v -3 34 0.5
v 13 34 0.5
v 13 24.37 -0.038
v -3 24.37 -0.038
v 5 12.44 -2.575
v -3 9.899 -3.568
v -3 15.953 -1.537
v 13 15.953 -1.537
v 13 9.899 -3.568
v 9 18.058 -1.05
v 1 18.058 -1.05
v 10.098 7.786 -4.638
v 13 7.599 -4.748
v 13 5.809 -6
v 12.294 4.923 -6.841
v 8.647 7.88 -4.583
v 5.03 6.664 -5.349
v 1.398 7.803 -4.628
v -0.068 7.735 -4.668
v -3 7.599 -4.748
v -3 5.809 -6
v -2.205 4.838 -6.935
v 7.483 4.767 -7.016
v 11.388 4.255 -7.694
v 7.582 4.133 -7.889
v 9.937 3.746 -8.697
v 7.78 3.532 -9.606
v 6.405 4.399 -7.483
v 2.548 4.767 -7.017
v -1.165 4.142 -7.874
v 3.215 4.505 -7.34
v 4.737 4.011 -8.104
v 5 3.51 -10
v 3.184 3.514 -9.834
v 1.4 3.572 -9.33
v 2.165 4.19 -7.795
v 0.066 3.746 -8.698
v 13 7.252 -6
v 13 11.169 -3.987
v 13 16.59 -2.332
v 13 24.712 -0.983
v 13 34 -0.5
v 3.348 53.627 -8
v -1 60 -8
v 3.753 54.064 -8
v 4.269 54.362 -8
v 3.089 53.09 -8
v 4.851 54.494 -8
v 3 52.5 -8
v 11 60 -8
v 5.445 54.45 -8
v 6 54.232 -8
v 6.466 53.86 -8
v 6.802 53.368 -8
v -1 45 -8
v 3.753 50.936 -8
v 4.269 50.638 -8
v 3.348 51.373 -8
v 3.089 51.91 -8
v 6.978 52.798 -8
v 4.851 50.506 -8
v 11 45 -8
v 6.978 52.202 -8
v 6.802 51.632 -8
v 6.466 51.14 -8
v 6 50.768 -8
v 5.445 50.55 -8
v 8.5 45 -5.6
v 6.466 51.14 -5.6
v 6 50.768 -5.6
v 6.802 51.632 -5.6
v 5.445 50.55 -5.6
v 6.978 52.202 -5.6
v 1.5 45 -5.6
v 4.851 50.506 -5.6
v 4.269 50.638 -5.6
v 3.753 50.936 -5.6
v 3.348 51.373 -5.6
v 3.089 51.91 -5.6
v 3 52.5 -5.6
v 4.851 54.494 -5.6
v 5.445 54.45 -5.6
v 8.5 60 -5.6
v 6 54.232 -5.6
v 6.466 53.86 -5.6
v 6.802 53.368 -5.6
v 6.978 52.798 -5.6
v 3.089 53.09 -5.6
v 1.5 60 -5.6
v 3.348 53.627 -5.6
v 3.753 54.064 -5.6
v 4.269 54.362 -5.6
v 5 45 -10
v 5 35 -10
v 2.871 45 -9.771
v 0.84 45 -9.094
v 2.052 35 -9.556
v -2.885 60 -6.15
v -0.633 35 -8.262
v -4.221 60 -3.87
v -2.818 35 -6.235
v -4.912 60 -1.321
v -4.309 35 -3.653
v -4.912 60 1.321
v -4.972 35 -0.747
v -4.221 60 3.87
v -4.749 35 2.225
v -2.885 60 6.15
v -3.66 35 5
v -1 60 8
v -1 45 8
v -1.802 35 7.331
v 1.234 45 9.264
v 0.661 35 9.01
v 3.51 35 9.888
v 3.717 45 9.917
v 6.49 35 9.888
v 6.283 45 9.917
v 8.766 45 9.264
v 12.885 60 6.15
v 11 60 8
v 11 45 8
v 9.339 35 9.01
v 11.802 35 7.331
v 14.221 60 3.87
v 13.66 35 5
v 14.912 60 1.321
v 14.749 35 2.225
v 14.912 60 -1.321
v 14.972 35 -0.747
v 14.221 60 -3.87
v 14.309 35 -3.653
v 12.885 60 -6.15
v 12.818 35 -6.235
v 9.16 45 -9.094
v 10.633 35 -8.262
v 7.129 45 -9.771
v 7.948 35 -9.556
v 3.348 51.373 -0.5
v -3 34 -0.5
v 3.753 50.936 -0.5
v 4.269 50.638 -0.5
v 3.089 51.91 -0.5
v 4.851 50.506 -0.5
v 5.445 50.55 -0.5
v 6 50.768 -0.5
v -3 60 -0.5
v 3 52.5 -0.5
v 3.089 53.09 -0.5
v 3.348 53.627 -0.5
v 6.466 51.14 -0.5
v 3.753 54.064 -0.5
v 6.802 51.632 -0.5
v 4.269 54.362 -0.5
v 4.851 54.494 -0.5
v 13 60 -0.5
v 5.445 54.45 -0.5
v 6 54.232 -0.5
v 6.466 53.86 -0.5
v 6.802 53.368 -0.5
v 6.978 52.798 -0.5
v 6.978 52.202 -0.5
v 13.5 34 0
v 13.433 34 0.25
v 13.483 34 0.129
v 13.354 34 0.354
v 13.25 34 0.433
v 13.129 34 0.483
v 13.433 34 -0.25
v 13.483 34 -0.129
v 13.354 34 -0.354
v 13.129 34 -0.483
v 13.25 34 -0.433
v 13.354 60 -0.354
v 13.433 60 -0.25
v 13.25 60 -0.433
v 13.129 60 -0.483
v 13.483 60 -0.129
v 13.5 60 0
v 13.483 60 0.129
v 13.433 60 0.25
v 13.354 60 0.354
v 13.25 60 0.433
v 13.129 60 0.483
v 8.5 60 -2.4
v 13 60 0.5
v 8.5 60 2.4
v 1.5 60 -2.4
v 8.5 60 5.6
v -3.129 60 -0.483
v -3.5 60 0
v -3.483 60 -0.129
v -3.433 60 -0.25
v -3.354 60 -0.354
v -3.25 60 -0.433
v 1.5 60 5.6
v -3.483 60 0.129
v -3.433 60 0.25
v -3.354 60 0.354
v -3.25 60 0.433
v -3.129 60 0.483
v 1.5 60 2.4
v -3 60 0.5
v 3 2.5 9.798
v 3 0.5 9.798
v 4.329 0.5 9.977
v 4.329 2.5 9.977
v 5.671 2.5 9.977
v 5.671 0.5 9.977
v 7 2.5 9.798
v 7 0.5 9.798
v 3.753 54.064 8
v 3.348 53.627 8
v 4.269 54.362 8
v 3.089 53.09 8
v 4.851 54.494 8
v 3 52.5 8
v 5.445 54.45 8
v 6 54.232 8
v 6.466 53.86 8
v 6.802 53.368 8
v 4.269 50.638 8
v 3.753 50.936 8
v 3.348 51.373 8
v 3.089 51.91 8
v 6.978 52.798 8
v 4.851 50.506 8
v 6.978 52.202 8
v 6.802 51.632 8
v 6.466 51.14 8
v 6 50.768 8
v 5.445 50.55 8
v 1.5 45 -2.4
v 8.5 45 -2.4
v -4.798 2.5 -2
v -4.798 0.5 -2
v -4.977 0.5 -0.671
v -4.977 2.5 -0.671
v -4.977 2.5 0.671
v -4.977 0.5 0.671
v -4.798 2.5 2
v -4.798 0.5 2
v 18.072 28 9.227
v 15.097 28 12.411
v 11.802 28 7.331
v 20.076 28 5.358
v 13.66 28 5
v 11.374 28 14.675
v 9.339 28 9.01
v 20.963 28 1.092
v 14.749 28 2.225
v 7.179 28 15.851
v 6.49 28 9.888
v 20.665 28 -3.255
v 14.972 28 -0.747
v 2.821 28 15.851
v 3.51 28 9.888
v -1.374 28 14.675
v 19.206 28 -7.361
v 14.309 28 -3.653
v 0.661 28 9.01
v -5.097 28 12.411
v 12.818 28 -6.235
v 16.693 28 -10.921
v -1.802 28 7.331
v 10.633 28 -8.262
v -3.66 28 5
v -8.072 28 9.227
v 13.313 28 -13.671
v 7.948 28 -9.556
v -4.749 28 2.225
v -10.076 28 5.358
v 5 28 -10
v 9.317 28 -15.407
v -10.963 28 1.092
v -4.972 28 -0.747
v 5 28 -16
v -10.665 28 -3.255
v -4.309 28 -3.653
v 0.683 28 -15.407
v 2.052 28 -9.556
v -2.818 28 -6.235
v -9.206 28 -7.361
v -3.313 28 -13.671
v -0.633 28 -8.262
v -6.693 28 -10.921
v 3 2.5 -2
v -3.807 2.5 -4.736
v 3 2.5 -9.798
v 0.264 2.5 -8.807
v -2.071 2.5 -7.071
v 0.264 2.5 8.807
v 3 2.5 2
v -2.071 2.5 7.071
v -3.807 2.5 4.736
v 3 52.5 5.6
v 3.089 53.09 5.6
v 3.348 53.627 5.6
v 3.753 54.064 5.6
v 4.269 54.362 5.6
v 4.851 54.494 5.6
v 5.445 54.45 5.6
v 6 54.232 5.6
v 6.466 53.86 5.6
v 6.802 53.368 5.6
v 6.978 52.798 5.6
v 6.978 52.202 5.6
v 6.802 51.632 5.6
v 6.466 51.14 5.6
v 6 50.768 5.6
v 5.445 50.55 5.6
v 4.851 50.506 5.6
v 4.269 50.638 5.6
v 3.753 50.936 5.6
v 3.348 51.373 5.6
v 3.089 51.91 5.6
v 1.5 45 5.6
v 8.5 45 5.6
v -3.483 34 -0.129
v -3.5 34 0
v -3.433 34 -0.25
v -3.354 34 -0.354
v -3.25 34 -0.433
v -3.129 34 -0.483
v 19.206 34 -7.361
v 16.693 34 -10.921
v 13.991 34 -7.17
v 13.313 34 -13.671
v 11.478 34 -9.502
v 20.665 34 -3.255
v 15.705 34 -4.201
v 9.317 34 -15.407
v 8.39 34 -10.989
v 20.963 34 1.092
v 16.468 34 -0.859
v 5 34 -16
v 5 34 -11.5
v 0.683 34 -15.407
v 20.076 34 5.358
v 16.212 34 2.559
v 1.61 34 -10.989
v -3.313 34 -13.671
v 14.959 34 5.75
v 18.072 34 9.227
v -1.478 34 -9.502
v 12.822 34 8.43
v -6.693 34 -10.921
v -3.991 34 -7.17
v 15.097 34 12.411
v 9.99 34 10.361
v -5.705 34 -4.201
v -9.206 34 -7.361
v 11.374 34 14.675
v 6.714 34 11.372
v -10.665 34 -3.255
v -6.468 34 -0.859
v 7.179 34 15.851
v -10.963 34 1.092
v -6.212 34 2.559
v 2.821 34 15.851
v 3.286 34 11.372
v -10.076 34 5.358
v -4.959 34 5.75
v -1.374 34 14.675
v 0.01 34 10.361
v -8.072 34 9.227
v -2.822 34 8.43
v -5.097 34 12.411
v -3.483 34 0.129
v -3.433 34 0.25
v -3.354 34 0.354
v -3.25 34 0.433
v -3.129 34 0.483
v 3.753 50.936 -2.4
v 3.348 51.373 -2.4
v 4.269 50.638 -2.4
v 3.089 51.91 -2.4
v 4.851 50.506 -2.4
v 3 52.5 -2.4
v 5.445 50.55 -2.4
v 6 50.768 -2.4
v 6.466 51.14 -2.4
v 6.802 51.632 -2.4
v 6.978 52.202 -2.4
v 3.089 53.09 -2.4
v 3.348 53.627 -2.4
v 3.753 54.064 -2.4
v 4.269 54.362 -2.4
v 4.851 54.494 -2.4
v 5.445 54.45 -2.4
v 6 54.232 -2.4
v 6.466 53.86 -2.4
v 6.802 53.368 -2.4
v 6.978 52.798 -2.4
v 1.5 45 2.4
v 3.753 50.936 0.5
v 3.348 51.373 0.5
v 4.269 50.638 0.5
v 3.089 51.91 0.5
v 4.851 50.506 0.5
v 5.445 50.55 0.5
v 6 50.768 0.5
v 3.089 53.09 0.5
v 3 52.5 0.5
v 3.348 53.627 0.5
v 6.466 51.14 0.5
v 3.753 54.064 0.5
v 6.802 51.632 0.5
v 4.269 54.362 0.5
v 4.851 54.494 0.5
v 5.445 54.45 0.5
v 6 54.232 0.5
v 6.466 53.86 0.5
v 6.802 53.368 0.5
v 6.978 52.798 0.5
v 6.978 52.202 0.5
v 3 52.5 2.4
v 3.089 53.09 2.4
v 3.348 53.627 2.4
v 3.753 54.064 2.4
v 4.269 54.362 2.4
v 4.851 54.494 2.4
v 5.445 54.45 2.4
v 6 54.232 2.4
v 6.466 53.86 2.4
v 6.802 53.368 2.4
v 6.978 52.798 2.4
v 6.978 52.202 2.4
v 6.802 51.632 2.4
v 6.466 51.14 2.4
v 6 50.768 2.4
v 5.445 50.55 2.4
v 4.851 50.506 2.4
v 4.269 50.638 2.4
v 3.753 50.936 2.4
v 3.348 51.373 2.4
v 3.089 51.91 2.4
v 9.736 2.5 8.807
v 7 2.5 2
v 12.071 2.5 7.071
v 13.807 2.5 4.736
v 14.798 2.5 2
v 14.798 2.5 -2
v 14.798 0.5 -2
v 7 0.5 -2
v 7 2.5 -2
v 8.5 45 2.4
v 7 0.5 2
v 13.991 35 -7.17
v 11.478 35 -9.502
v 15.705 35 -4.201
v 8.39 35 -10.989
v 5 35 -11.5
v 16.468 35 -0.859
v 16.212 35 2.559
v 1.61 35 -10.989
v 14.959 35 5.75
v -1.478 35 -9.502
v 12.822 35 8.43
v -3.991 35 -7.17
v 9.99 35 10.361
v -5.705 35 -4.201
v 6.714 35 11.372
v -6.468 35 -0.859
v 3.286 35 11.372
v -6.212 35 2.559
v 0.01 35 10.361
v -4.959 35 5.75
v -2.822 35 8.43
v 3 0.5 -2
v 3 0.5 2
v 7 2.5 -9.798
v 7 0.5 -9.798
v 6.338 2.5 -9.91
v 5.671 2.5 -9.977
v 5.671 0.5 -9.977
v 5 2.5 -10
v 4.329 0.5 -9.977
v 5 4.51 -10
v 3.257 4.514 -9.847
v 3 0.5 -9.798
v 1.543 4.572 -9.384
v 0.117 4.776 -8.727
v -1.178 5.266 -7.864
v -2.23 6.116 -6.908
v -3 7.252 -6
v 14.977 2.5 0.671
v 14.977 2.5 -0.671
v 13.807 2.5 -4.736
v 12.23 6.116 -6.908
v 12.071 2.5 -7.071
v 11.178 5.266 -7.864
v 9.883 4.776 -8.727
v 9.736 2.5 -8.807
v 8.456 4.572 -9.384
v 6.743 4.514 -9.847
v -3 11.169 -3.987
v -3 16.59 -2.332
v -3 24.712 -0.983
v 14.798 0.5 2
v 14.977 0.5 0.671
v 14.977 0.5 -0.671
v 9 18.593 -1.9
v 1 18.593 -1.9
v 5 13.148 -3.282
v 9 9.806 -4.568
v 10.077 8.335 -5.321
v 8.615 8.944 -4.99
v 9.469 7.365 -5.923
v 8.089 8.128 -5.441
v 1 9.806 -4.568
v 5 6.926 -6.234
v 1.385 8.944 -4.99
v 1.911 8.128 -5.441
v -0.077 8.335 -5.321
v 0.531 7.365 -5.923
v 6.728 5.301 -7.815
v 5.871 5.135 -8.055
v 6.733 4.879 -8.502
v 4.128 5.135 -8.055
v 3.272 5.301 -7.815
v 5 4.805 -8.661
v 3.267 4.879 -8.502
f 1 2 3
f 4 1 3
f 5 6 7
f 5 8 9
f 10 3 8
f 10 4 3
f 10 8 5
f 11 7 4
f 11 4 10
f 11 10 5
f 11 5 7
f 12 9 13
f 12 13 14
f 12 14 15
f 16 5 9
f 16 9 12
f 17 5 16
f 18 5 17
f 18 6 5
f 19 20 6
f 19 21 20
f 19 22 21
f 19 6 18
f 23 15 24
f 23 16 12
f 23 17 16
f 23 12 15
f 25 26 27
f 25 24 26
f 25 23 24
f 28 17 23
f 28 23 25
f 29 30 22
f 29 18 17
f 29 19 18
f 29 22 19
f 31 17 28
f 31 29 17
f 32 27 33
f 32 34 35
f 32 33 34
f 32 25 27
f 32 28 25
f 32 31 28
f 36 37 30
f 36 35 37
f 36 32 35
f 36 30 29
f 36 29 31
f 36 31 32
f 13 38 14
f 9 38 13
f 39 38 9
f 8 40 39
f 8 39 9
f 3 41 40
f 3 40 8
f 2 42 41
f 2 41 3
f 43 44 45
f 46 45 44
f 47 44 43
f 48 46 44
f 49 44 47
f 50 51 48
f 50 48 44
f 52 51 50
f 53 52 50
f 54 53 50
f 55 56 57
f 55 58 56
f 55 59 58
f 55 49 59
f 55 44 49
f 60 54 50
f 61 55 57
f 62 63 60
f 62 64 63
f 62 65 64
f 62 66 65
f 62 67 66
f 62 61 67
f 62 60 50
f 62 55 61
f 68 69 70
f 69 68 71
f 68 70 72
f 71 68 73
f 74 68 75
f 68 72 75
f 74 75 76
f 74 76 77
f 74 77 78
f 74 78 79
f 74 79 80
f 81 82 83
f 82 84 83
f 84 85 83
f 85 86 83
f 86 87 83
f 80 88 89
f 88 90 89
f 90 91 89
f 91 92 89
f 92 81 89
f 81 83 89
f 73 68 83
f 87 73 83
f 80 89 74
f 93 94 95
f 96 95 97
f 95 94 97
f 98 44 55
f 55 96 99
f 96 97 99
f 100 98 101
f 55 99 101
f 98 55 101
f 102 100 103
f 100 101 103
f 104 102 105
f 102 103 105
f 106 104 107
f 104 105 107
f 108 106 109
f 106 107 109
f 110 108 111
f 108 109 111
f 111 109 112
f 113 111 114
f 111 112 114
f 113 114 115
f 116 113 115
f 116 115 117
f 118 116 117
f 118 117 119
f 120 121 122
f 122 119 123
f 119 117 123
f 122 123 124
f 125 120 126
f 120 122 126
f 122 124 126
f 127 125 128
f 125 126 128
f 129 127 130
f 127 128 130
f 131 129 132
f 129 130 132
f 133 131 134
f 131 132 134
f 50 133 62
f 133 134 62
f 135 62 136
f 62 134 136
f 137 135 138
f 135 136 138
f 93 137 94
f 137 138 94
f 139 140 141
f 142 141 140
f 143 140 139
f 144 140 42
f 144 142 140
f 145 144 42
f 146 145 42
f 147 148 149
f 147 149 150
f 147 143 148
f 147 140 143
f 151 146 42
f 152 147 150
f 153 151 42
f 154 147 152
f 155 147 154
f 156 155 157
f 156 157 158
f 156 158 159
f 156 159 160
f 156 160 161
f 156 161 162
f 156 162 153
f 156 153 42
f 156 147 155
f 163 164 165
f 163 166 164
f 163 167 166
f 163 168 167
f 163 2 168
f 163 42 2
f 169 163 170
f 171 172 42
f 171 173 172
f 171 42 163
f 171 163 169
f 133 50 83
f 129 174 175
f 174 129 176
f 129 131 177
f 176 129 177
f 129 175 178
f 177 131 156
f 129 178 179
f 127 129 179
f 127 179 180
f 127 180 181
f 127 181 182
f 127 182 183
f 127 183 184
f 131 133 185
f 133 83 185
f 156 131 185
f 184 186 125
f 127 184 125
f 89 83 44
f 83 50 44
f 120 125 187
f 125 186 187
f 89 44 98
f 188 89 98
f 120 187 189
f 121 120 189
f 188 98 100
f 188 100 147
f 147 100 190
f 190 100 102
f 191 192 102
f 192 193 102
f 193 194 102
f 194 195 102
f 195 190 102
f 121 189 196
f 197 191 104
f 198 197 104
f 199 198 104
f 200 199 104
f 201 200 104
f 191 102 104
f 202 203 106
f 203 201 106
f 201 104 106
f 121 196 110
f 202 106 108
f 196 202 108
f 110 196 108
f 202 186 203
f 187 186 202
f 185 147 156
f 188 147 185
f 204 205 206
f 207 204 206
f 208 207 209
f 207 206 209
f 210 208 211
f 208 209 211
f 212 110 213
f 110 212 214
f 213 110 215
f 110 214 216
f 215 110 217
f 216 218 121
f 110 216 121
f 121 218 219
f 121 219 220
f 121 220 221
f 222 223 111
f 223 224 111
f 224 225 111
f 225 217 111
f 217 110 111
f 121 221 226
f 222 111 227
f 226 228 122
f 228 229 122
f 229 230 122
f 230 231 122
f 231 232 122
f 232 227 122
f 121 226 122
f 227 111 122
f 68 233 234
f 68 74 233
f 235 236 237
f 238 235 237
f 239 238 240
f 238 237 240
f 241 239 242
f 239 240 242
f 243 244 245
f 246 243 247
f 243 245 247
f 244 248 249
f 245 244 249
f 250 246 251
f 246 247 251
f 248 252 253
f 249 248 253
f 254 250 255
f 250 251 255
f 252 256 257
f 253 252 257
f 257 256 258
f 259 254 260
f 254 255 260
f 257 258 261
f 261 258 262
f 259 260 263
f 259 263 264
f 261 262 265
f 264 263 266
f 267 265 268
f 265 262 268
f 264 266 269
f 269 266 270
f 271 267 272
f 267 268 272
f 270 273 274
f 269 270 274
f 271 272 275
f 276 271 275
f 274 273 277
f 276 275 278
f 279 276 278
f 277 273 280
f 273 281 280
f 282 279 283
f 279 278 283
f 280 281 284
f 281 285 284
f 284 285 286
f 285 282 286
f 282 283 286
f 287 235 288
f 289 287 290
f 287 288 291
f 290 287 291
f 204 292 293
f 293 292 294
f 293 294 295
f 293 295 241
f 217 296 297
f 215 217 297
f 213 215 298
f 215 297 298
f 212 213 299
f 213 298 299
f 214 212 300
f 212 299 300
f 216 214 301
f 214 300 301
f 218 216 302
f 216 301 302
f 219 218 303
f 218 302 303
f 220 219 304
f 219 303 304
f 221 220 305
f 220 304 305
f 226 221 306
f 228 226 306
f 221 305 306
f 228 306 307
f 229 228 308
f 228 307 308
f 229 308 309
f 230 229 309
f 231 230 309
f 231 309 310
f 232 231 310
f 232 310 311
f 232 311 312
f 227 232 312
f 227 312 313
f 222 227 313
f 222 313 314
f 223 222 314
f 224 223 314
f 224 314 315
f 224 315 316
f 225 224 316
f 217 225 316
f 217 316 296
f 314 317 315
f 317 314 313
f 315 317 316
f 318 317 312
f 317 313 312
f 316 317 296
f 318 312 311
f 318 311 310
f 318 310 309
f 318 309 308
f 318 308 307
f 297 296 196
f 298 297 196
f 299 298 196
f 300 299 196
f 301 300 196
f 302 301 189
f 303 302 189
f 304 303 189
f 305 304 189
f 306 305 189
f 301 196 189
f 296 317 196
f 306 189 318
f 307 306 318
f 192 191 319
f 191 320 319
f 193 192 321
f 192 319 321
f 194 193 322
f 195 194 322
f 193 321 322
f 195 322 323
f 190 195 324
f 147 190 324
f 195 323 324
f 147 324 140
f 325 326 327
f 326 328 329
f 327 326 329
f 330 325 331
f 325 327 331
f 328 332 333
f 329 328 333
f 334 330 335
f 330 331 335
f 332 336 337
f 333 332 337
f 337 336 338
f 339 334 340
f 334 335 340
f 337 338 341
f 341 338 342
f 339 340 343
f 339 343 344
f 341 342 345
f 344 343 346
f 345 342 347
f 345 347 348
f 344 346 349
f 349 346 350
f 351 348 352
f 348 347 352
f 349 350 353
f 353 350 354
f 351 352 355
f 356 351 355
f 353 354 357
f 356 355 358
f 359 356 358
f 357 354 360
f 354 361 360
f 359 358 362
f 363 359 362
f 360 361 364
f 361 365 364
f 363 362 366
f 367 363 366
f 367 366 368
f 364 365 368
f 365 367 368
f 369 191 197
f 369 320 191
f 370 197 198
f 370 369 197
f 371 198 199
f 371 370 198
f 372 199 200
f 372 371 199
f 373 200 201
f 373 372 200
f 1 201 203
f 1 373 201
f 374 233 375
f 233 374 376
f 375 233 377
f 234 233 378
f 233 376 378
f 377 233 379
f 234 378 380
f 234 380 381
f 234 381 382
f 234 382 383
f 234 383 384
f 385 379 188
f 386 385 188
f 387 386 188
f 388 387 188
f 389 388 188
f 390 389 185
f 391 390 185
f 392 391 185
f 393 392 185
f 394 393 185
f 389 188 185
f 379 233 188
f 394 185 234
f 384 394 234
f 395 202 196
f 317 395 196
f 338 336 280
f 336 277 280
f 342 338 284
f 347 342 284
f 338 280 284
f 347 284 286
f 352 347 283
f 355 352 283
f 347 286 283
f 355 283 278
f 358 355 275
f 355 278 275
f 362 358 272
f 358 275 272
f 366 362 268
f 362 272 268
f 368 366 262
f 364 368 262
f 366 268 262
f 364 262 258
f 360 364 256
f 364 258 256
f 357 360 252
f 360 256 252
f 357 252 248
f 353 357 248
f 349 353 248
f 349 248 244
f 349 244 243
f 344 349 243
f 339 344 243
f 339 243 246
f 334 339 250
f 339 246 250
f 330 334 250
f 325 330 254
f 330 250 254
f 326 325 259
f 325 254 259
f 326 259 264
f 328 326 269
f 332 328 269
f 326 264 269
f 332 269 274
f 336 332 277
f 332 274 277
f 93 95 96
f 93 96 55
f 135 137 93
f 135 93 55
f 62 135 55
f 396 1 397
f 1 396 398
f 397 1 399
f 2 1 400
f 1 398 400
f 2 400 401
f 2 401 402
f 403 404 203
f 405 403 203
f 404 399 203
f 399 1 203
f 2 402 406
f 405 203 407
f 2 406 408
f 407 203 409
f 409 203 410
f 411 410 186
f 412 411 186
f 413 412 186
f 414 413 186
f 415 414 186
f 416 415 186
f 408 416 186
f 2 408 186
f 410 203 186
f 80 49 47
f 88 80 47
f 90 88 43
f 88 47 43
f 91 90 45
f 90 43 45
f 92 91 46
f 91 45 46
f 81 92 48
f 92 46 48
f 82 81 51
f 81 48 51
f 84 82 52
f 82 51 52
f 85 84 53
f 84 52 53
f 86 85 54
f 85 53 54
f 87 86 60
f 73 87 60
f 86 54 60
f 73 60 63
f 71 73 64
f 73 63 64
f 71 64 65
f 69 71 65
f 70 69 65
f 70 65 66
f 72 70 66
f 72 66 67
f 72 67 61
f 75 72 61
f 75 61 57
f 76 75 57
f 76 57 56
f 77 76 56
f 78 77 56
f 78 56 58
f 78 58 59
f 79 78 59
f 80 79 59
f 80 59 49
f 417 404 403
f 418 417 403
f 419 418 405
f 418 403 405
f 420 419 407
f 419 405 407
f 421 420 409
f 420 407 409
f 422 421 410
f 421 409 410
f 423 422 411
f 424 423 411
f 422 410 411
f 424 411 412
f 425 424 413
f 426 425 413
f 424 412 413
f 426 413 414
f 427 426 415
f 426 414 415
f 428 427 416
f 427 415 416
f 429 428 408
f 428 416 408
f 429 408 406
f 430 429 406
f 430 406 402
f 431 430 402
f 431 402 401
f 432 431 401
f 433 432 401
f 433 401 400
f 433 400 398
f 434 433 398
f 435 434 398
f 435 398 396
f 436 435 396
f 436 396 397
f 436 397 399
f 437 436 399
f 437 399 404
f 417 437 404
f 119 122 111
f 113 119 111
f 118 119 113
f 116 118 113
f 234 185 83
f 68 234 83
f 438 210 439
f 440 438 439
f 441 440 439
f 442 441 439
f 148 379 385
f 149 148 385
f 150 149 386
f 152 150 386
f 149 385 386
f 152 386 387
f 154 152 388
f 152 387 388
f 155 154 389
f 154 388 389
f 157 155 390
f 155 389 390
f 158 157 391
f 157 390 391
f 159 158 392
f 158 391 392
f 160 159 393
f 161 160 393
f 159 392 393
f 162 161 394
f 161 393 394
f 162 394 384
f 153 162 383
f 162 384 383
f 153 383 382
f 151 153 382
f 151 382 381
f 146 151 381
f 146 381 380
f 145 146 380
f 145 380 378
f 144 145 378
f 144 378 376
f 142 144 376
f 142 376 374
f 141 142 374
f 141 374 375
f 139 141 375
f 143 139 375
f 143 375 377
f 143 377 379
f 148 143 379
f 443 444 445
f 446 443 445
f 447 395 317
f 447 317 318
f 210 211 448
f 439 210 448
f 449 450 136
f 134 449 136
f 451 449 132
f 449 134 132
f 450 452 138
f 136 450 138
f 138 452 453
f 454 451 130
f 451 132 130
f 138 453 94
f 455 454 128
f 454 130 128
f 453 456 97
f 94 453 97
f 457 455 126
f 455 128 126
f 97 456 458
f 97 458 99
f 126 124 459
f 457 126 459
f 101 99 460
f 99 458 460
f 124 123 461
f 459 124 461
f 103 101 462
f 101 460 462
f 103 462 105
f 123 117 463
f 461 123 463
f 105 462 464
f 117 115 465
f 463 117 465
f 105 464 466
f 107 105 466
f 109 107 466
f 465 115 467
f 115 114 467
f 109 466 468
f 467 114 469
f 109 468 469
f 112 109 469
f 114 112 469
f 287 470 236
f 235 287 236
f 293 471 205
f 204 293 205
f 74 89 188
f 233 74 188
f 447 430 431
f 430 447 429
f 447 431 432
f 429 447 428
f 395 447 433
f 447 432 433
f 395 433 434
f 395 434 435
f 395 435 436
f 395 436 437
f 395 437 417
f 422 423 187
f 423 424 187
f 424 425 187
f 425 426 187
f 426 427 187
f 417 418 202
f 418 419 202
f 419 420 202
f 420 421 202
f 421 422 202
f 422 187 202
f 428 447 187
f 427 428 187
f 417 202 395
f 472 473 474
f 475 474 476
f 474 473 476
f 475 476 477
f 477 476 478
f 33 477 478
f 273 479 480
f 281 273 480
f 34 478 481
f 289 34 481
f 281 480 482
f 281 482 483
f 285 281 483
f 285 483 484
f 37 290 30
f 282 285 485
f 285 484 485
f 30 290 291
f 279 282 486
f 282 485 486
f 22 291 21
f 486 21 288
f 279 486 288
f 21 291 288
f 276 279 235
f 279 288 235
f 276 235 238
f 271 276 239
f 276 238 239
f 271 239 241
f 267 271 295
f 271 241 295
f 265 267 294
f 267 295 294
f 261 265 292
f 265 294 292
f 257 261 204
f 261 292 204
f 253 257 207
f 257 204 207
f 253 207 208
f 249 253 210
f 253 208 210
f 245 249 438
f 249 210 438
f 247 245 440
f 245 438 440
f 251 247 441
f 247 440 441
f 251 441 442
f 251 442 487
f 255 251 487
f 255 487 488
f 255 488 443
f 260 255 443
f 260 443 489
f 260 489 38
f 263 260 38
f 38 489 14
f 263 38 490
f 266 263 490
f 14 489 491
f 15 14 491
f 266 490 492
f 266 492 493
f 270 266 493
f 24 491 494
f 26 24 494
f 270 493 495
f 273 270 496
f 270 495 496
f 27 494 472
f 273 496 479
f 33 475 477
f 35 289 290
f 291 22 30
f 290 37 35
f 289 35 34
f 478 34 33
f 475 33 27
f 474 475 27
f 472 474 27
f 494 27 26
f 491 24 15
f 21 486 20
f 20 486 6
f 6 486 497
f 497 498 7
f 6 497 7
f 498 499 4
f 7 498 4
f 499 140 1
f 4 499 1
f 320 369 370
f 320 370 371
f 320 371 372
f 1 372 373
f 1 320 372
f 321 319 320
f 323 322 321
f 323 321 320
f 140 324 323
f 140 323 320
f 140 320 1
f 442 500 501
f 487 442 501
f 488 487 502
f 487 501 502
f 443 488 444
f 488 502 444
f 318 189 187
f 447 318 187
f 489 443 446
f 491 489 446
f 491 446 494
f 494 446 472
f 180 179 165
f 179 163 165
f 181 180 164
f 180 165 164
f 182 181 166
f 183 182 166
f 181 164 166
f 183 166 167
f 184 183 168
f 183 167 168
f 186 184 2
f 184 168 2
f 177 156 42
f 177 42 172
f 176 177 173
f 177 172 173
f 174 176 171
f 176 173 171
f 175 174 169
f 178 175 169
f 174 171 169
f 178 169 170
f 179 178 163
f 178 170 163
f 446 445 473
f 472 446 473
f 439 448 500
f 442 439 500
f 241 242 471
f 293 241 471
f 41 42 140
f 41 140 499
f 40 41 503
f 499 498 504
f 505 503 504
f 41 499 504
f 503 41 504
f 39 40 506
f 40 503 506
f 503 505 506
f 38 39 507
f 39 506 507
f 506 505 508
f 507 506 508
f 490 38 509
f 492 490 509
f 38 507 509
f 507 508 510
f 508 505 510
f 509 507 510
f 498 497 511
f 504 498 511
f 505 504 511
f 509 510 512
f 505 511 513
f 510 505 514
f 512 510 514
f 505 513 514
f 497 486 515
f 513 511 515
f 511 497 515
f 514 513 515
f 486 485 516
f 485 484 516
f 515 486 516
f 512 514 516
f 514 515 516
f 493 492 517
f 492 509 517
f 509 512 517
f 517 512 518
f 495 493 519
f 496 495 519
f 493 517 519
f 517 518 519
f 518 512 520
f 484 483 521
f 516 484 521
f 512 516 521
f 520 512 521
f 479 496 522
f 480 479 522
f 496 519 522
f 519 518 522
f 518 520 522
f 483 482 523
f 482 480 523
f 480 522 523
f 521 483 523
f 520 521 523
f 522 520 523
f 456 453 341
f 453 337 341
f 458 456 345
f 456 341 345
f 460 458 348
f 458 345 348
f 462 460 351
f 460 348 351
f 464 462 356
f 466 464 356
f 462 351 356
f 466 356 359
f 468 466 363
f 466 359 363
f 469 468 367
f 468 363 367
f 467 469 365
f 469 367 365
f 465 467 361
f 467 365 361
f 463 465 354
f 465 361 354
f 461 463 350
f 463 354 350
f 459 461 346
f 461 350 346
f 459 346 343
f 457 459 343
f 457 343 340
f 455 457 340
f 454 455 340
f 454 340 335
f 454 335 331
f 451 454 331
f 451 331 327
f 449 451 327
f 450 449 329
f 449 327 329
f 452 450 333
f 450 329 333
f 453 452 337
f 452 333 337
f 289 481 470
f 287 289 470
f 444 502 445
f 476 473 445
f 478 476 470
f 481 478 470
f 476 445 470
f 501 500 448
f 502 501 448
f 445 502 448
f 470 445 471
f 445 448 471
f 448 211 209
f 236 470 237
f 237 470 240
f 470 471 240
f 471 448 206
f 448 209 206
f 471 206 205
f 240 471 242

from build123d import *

# Parameters (mm, degrees)
SKETCH_2_W               = 17
SKETCH_2_H               = 1
CUT_EXTRUDE_1_DEPTH      = 26
FILLET_1_R               = 0.5
CUT_EXTRUDE_START        = -15
CUT_EXTRUDE_2_DEPTH      = 15
CUT_EXTRUDE_3_DEPTH      = 15
SKETCH_5_R               = 2
CUT_EXTRUDE_4_DEPTH      = 17
EXTRUDE_START            = 2
EXTRUDE_1_DEPTH          = 2
CUT_EXTRUDE_5_DEPTH      = 8
CUT_EXTRUDE_5_DEPTH_BACK = 8


with BuildPart() as part:
    # 草图1 → 旋转1 (revolve)
    with BuildSketch(Plane.XY, mode=Mode.PRIVATE) as revolve_1_sk:
        Polygon((5, 2.5), (5, 60), (-5, 60), (-5, 35), (-6.5, 35), (-6.5, 34), (-11, 34), (-11, 28), (-5, 28), (-5, 2.5), align=None)
    revolve(revolve_1_sk.sketch.rotate(Axis((5, 2.5, 0), (0, 1, 0)), 270), axis=Axis((5, 2.5, 0), (0, 1, 0)))

    # 草图2 → 切除-拉伸1 (cut)
    with BuildSketch(Plane(origin=(0, 60, 0), x_dir=(1, 0, 0), z_dir=(0, 1, 0))):
        with Locations((5, 0)):
            Rectangle(SKETCH_2_W, SKETCH_2_H)
    extrude(amount=-CUT_EXTRUDE_1_DEPTH, mode=Mode.SUBTRACT)

    # 圆角1
    fillet_1_edges = [part.edges().sort_by_distance(p)[0] for p in [
        (-3.5, 47, 0.5),
        (-3.5, 47, -0.5),
        (13.5, 47, 0.5),
        (13.5, 47, -0.5),
    ]]
    fillet(fillet_1_edges, radius=FILLET_1_R - 0.0001)  # a hair under: the kernel refuses the full size

    # 草图3 → 切除-拉伸2 (cut)
    with BuildSketch(Plane(origin=(0, 60, 0), x_dir=(1, 0, 0), z_dir=(0, 1, 0)).offset(CUT_EXTRUDE_START)):
        with BuildLine():
            Line((5, -8), (11, -8))
            ThreePointArc((11, -8), (5, -10), (-1, -8))
            Line((-1, -8), (5, -8))
        make_face()
        with BuildLine():
            Line((5, 8), (11, 8))
            ThreePointArc((11, 8), (5, 10), (-1, 8))
            Line((-1, 8), (5, 8))
        make_face()
    extrude(amount=CUT_EXTRUDE_2_DEPTH, mode=Mode.SUBTRACT)

    # 草图4 → 切除-拉伸3 (cut)
    with BuildSketch(Plane(origin=(0, 60, 0), x_dir=(1, 0, 0), z_dir=(0, 1, 0))):
        Polygon((1.5, -2.4), (1.5, -4), (1.5, -5.6), (8.5, -5.6), (8.5, -2.4), align=None)
        Polygon((1.5, 4), (1.5, 2.4), (8.5, 2.4), (8.5, 5.6), (1.5, 5.6), align=None)
    extrude(amount=-CUT_EXTRUDE_3_DEPTH, mode=Mode.SUBTRACT)

    # 草图5 → 切除-拉伸4 (cut)
    with BuildSketch(Plane(origin=(0, 0, -8), x_dir=(-1, 0, 0), z_dir=(0, 0, -1))):
        with Locations((-5, 52.5)):
            Circle(SKETCH_5_R)
    extrude(amount=-CUT_EXTRUDE_4_DEPTH, mode=Mode.SUBTRACT)

    # 草图6 → 凸台-拉伸1 (add)
    with BuildSketch(Plane.XZ.offset(-2.5).offset(EXTRUDE_START)):
        with BuildLine():
            Line((7, 2), (14.797958971, 2))
            ThreePointArc((14.797958971, 2), (15, 0), (14.797958971, -2))
            Line((14.797958971, -2), (7, -2))
            Line((7, -2), (7, -9.797958971))
            ThreePointArc((7, -9.797958971), (5, -10), (3, -9.797958971))
            Line((3, -9.797958971), (3, -2))
            Line((3, -2), (-4.797958971, -2))
            ThreePointArc((-4.797958971, -2), (-5, 0), (-4.797958971, 2))
            Line((-4.797958971, 2), (3, 2))
            Line((3, 2), (3, 9.797958971))
            ThreePointArc((3, 9.797958971), (5, 10), (7, 9.797958971))
            Line((7, 9.797958971), (7, 2))
        make_face()
    extrude(amount=-EXTRUDE_1_DEPTH)

    # 草图7 → 切除-拉伸5 (cut, two sides: drawn at the far end of the back side and taken through both)
    with BuildSketch(Plane(origin=(5, 0, 0), x_dir=(0, 0, -1), z_dir=(1, 0, 0)).offset(-CUT_EXTRUDE_5_DEPTH_BACK)):
        with BuildLine():
            Line((10, 4.510210526), (10, 3.510210526))
            add(Edge.make_bspline(
                [(-0.5, 34), (-0.5, 3.510210526), (10, 3.510210526)],
                knots=[1.570796327, 1.570796327, 1.570796327, 3.141592654, 3.141592654, 3.141592654], degree=2, weights=[1, 0.707106781, 1]))
            Line((-0.5, 34), (0.5, 34))
            add(Edge.make_bspline(
                [(0.5, 34), (0.5, 4.510210526), (10, 4.510210526)],
                knots=[1.570796327, 1.570796327, 1.570796327, 3.141592654, 3.141592654, 3.141592654], degree=2, weights=[1, 0.707106781, 1]))
        make_face()
    extrude(amount=CUT_EXTRUDE_5_DEPTH + CUT_EXTRUDE_5_DEPTH_BACK, mode=Mode.SUBTRACT)


solid = part.part
